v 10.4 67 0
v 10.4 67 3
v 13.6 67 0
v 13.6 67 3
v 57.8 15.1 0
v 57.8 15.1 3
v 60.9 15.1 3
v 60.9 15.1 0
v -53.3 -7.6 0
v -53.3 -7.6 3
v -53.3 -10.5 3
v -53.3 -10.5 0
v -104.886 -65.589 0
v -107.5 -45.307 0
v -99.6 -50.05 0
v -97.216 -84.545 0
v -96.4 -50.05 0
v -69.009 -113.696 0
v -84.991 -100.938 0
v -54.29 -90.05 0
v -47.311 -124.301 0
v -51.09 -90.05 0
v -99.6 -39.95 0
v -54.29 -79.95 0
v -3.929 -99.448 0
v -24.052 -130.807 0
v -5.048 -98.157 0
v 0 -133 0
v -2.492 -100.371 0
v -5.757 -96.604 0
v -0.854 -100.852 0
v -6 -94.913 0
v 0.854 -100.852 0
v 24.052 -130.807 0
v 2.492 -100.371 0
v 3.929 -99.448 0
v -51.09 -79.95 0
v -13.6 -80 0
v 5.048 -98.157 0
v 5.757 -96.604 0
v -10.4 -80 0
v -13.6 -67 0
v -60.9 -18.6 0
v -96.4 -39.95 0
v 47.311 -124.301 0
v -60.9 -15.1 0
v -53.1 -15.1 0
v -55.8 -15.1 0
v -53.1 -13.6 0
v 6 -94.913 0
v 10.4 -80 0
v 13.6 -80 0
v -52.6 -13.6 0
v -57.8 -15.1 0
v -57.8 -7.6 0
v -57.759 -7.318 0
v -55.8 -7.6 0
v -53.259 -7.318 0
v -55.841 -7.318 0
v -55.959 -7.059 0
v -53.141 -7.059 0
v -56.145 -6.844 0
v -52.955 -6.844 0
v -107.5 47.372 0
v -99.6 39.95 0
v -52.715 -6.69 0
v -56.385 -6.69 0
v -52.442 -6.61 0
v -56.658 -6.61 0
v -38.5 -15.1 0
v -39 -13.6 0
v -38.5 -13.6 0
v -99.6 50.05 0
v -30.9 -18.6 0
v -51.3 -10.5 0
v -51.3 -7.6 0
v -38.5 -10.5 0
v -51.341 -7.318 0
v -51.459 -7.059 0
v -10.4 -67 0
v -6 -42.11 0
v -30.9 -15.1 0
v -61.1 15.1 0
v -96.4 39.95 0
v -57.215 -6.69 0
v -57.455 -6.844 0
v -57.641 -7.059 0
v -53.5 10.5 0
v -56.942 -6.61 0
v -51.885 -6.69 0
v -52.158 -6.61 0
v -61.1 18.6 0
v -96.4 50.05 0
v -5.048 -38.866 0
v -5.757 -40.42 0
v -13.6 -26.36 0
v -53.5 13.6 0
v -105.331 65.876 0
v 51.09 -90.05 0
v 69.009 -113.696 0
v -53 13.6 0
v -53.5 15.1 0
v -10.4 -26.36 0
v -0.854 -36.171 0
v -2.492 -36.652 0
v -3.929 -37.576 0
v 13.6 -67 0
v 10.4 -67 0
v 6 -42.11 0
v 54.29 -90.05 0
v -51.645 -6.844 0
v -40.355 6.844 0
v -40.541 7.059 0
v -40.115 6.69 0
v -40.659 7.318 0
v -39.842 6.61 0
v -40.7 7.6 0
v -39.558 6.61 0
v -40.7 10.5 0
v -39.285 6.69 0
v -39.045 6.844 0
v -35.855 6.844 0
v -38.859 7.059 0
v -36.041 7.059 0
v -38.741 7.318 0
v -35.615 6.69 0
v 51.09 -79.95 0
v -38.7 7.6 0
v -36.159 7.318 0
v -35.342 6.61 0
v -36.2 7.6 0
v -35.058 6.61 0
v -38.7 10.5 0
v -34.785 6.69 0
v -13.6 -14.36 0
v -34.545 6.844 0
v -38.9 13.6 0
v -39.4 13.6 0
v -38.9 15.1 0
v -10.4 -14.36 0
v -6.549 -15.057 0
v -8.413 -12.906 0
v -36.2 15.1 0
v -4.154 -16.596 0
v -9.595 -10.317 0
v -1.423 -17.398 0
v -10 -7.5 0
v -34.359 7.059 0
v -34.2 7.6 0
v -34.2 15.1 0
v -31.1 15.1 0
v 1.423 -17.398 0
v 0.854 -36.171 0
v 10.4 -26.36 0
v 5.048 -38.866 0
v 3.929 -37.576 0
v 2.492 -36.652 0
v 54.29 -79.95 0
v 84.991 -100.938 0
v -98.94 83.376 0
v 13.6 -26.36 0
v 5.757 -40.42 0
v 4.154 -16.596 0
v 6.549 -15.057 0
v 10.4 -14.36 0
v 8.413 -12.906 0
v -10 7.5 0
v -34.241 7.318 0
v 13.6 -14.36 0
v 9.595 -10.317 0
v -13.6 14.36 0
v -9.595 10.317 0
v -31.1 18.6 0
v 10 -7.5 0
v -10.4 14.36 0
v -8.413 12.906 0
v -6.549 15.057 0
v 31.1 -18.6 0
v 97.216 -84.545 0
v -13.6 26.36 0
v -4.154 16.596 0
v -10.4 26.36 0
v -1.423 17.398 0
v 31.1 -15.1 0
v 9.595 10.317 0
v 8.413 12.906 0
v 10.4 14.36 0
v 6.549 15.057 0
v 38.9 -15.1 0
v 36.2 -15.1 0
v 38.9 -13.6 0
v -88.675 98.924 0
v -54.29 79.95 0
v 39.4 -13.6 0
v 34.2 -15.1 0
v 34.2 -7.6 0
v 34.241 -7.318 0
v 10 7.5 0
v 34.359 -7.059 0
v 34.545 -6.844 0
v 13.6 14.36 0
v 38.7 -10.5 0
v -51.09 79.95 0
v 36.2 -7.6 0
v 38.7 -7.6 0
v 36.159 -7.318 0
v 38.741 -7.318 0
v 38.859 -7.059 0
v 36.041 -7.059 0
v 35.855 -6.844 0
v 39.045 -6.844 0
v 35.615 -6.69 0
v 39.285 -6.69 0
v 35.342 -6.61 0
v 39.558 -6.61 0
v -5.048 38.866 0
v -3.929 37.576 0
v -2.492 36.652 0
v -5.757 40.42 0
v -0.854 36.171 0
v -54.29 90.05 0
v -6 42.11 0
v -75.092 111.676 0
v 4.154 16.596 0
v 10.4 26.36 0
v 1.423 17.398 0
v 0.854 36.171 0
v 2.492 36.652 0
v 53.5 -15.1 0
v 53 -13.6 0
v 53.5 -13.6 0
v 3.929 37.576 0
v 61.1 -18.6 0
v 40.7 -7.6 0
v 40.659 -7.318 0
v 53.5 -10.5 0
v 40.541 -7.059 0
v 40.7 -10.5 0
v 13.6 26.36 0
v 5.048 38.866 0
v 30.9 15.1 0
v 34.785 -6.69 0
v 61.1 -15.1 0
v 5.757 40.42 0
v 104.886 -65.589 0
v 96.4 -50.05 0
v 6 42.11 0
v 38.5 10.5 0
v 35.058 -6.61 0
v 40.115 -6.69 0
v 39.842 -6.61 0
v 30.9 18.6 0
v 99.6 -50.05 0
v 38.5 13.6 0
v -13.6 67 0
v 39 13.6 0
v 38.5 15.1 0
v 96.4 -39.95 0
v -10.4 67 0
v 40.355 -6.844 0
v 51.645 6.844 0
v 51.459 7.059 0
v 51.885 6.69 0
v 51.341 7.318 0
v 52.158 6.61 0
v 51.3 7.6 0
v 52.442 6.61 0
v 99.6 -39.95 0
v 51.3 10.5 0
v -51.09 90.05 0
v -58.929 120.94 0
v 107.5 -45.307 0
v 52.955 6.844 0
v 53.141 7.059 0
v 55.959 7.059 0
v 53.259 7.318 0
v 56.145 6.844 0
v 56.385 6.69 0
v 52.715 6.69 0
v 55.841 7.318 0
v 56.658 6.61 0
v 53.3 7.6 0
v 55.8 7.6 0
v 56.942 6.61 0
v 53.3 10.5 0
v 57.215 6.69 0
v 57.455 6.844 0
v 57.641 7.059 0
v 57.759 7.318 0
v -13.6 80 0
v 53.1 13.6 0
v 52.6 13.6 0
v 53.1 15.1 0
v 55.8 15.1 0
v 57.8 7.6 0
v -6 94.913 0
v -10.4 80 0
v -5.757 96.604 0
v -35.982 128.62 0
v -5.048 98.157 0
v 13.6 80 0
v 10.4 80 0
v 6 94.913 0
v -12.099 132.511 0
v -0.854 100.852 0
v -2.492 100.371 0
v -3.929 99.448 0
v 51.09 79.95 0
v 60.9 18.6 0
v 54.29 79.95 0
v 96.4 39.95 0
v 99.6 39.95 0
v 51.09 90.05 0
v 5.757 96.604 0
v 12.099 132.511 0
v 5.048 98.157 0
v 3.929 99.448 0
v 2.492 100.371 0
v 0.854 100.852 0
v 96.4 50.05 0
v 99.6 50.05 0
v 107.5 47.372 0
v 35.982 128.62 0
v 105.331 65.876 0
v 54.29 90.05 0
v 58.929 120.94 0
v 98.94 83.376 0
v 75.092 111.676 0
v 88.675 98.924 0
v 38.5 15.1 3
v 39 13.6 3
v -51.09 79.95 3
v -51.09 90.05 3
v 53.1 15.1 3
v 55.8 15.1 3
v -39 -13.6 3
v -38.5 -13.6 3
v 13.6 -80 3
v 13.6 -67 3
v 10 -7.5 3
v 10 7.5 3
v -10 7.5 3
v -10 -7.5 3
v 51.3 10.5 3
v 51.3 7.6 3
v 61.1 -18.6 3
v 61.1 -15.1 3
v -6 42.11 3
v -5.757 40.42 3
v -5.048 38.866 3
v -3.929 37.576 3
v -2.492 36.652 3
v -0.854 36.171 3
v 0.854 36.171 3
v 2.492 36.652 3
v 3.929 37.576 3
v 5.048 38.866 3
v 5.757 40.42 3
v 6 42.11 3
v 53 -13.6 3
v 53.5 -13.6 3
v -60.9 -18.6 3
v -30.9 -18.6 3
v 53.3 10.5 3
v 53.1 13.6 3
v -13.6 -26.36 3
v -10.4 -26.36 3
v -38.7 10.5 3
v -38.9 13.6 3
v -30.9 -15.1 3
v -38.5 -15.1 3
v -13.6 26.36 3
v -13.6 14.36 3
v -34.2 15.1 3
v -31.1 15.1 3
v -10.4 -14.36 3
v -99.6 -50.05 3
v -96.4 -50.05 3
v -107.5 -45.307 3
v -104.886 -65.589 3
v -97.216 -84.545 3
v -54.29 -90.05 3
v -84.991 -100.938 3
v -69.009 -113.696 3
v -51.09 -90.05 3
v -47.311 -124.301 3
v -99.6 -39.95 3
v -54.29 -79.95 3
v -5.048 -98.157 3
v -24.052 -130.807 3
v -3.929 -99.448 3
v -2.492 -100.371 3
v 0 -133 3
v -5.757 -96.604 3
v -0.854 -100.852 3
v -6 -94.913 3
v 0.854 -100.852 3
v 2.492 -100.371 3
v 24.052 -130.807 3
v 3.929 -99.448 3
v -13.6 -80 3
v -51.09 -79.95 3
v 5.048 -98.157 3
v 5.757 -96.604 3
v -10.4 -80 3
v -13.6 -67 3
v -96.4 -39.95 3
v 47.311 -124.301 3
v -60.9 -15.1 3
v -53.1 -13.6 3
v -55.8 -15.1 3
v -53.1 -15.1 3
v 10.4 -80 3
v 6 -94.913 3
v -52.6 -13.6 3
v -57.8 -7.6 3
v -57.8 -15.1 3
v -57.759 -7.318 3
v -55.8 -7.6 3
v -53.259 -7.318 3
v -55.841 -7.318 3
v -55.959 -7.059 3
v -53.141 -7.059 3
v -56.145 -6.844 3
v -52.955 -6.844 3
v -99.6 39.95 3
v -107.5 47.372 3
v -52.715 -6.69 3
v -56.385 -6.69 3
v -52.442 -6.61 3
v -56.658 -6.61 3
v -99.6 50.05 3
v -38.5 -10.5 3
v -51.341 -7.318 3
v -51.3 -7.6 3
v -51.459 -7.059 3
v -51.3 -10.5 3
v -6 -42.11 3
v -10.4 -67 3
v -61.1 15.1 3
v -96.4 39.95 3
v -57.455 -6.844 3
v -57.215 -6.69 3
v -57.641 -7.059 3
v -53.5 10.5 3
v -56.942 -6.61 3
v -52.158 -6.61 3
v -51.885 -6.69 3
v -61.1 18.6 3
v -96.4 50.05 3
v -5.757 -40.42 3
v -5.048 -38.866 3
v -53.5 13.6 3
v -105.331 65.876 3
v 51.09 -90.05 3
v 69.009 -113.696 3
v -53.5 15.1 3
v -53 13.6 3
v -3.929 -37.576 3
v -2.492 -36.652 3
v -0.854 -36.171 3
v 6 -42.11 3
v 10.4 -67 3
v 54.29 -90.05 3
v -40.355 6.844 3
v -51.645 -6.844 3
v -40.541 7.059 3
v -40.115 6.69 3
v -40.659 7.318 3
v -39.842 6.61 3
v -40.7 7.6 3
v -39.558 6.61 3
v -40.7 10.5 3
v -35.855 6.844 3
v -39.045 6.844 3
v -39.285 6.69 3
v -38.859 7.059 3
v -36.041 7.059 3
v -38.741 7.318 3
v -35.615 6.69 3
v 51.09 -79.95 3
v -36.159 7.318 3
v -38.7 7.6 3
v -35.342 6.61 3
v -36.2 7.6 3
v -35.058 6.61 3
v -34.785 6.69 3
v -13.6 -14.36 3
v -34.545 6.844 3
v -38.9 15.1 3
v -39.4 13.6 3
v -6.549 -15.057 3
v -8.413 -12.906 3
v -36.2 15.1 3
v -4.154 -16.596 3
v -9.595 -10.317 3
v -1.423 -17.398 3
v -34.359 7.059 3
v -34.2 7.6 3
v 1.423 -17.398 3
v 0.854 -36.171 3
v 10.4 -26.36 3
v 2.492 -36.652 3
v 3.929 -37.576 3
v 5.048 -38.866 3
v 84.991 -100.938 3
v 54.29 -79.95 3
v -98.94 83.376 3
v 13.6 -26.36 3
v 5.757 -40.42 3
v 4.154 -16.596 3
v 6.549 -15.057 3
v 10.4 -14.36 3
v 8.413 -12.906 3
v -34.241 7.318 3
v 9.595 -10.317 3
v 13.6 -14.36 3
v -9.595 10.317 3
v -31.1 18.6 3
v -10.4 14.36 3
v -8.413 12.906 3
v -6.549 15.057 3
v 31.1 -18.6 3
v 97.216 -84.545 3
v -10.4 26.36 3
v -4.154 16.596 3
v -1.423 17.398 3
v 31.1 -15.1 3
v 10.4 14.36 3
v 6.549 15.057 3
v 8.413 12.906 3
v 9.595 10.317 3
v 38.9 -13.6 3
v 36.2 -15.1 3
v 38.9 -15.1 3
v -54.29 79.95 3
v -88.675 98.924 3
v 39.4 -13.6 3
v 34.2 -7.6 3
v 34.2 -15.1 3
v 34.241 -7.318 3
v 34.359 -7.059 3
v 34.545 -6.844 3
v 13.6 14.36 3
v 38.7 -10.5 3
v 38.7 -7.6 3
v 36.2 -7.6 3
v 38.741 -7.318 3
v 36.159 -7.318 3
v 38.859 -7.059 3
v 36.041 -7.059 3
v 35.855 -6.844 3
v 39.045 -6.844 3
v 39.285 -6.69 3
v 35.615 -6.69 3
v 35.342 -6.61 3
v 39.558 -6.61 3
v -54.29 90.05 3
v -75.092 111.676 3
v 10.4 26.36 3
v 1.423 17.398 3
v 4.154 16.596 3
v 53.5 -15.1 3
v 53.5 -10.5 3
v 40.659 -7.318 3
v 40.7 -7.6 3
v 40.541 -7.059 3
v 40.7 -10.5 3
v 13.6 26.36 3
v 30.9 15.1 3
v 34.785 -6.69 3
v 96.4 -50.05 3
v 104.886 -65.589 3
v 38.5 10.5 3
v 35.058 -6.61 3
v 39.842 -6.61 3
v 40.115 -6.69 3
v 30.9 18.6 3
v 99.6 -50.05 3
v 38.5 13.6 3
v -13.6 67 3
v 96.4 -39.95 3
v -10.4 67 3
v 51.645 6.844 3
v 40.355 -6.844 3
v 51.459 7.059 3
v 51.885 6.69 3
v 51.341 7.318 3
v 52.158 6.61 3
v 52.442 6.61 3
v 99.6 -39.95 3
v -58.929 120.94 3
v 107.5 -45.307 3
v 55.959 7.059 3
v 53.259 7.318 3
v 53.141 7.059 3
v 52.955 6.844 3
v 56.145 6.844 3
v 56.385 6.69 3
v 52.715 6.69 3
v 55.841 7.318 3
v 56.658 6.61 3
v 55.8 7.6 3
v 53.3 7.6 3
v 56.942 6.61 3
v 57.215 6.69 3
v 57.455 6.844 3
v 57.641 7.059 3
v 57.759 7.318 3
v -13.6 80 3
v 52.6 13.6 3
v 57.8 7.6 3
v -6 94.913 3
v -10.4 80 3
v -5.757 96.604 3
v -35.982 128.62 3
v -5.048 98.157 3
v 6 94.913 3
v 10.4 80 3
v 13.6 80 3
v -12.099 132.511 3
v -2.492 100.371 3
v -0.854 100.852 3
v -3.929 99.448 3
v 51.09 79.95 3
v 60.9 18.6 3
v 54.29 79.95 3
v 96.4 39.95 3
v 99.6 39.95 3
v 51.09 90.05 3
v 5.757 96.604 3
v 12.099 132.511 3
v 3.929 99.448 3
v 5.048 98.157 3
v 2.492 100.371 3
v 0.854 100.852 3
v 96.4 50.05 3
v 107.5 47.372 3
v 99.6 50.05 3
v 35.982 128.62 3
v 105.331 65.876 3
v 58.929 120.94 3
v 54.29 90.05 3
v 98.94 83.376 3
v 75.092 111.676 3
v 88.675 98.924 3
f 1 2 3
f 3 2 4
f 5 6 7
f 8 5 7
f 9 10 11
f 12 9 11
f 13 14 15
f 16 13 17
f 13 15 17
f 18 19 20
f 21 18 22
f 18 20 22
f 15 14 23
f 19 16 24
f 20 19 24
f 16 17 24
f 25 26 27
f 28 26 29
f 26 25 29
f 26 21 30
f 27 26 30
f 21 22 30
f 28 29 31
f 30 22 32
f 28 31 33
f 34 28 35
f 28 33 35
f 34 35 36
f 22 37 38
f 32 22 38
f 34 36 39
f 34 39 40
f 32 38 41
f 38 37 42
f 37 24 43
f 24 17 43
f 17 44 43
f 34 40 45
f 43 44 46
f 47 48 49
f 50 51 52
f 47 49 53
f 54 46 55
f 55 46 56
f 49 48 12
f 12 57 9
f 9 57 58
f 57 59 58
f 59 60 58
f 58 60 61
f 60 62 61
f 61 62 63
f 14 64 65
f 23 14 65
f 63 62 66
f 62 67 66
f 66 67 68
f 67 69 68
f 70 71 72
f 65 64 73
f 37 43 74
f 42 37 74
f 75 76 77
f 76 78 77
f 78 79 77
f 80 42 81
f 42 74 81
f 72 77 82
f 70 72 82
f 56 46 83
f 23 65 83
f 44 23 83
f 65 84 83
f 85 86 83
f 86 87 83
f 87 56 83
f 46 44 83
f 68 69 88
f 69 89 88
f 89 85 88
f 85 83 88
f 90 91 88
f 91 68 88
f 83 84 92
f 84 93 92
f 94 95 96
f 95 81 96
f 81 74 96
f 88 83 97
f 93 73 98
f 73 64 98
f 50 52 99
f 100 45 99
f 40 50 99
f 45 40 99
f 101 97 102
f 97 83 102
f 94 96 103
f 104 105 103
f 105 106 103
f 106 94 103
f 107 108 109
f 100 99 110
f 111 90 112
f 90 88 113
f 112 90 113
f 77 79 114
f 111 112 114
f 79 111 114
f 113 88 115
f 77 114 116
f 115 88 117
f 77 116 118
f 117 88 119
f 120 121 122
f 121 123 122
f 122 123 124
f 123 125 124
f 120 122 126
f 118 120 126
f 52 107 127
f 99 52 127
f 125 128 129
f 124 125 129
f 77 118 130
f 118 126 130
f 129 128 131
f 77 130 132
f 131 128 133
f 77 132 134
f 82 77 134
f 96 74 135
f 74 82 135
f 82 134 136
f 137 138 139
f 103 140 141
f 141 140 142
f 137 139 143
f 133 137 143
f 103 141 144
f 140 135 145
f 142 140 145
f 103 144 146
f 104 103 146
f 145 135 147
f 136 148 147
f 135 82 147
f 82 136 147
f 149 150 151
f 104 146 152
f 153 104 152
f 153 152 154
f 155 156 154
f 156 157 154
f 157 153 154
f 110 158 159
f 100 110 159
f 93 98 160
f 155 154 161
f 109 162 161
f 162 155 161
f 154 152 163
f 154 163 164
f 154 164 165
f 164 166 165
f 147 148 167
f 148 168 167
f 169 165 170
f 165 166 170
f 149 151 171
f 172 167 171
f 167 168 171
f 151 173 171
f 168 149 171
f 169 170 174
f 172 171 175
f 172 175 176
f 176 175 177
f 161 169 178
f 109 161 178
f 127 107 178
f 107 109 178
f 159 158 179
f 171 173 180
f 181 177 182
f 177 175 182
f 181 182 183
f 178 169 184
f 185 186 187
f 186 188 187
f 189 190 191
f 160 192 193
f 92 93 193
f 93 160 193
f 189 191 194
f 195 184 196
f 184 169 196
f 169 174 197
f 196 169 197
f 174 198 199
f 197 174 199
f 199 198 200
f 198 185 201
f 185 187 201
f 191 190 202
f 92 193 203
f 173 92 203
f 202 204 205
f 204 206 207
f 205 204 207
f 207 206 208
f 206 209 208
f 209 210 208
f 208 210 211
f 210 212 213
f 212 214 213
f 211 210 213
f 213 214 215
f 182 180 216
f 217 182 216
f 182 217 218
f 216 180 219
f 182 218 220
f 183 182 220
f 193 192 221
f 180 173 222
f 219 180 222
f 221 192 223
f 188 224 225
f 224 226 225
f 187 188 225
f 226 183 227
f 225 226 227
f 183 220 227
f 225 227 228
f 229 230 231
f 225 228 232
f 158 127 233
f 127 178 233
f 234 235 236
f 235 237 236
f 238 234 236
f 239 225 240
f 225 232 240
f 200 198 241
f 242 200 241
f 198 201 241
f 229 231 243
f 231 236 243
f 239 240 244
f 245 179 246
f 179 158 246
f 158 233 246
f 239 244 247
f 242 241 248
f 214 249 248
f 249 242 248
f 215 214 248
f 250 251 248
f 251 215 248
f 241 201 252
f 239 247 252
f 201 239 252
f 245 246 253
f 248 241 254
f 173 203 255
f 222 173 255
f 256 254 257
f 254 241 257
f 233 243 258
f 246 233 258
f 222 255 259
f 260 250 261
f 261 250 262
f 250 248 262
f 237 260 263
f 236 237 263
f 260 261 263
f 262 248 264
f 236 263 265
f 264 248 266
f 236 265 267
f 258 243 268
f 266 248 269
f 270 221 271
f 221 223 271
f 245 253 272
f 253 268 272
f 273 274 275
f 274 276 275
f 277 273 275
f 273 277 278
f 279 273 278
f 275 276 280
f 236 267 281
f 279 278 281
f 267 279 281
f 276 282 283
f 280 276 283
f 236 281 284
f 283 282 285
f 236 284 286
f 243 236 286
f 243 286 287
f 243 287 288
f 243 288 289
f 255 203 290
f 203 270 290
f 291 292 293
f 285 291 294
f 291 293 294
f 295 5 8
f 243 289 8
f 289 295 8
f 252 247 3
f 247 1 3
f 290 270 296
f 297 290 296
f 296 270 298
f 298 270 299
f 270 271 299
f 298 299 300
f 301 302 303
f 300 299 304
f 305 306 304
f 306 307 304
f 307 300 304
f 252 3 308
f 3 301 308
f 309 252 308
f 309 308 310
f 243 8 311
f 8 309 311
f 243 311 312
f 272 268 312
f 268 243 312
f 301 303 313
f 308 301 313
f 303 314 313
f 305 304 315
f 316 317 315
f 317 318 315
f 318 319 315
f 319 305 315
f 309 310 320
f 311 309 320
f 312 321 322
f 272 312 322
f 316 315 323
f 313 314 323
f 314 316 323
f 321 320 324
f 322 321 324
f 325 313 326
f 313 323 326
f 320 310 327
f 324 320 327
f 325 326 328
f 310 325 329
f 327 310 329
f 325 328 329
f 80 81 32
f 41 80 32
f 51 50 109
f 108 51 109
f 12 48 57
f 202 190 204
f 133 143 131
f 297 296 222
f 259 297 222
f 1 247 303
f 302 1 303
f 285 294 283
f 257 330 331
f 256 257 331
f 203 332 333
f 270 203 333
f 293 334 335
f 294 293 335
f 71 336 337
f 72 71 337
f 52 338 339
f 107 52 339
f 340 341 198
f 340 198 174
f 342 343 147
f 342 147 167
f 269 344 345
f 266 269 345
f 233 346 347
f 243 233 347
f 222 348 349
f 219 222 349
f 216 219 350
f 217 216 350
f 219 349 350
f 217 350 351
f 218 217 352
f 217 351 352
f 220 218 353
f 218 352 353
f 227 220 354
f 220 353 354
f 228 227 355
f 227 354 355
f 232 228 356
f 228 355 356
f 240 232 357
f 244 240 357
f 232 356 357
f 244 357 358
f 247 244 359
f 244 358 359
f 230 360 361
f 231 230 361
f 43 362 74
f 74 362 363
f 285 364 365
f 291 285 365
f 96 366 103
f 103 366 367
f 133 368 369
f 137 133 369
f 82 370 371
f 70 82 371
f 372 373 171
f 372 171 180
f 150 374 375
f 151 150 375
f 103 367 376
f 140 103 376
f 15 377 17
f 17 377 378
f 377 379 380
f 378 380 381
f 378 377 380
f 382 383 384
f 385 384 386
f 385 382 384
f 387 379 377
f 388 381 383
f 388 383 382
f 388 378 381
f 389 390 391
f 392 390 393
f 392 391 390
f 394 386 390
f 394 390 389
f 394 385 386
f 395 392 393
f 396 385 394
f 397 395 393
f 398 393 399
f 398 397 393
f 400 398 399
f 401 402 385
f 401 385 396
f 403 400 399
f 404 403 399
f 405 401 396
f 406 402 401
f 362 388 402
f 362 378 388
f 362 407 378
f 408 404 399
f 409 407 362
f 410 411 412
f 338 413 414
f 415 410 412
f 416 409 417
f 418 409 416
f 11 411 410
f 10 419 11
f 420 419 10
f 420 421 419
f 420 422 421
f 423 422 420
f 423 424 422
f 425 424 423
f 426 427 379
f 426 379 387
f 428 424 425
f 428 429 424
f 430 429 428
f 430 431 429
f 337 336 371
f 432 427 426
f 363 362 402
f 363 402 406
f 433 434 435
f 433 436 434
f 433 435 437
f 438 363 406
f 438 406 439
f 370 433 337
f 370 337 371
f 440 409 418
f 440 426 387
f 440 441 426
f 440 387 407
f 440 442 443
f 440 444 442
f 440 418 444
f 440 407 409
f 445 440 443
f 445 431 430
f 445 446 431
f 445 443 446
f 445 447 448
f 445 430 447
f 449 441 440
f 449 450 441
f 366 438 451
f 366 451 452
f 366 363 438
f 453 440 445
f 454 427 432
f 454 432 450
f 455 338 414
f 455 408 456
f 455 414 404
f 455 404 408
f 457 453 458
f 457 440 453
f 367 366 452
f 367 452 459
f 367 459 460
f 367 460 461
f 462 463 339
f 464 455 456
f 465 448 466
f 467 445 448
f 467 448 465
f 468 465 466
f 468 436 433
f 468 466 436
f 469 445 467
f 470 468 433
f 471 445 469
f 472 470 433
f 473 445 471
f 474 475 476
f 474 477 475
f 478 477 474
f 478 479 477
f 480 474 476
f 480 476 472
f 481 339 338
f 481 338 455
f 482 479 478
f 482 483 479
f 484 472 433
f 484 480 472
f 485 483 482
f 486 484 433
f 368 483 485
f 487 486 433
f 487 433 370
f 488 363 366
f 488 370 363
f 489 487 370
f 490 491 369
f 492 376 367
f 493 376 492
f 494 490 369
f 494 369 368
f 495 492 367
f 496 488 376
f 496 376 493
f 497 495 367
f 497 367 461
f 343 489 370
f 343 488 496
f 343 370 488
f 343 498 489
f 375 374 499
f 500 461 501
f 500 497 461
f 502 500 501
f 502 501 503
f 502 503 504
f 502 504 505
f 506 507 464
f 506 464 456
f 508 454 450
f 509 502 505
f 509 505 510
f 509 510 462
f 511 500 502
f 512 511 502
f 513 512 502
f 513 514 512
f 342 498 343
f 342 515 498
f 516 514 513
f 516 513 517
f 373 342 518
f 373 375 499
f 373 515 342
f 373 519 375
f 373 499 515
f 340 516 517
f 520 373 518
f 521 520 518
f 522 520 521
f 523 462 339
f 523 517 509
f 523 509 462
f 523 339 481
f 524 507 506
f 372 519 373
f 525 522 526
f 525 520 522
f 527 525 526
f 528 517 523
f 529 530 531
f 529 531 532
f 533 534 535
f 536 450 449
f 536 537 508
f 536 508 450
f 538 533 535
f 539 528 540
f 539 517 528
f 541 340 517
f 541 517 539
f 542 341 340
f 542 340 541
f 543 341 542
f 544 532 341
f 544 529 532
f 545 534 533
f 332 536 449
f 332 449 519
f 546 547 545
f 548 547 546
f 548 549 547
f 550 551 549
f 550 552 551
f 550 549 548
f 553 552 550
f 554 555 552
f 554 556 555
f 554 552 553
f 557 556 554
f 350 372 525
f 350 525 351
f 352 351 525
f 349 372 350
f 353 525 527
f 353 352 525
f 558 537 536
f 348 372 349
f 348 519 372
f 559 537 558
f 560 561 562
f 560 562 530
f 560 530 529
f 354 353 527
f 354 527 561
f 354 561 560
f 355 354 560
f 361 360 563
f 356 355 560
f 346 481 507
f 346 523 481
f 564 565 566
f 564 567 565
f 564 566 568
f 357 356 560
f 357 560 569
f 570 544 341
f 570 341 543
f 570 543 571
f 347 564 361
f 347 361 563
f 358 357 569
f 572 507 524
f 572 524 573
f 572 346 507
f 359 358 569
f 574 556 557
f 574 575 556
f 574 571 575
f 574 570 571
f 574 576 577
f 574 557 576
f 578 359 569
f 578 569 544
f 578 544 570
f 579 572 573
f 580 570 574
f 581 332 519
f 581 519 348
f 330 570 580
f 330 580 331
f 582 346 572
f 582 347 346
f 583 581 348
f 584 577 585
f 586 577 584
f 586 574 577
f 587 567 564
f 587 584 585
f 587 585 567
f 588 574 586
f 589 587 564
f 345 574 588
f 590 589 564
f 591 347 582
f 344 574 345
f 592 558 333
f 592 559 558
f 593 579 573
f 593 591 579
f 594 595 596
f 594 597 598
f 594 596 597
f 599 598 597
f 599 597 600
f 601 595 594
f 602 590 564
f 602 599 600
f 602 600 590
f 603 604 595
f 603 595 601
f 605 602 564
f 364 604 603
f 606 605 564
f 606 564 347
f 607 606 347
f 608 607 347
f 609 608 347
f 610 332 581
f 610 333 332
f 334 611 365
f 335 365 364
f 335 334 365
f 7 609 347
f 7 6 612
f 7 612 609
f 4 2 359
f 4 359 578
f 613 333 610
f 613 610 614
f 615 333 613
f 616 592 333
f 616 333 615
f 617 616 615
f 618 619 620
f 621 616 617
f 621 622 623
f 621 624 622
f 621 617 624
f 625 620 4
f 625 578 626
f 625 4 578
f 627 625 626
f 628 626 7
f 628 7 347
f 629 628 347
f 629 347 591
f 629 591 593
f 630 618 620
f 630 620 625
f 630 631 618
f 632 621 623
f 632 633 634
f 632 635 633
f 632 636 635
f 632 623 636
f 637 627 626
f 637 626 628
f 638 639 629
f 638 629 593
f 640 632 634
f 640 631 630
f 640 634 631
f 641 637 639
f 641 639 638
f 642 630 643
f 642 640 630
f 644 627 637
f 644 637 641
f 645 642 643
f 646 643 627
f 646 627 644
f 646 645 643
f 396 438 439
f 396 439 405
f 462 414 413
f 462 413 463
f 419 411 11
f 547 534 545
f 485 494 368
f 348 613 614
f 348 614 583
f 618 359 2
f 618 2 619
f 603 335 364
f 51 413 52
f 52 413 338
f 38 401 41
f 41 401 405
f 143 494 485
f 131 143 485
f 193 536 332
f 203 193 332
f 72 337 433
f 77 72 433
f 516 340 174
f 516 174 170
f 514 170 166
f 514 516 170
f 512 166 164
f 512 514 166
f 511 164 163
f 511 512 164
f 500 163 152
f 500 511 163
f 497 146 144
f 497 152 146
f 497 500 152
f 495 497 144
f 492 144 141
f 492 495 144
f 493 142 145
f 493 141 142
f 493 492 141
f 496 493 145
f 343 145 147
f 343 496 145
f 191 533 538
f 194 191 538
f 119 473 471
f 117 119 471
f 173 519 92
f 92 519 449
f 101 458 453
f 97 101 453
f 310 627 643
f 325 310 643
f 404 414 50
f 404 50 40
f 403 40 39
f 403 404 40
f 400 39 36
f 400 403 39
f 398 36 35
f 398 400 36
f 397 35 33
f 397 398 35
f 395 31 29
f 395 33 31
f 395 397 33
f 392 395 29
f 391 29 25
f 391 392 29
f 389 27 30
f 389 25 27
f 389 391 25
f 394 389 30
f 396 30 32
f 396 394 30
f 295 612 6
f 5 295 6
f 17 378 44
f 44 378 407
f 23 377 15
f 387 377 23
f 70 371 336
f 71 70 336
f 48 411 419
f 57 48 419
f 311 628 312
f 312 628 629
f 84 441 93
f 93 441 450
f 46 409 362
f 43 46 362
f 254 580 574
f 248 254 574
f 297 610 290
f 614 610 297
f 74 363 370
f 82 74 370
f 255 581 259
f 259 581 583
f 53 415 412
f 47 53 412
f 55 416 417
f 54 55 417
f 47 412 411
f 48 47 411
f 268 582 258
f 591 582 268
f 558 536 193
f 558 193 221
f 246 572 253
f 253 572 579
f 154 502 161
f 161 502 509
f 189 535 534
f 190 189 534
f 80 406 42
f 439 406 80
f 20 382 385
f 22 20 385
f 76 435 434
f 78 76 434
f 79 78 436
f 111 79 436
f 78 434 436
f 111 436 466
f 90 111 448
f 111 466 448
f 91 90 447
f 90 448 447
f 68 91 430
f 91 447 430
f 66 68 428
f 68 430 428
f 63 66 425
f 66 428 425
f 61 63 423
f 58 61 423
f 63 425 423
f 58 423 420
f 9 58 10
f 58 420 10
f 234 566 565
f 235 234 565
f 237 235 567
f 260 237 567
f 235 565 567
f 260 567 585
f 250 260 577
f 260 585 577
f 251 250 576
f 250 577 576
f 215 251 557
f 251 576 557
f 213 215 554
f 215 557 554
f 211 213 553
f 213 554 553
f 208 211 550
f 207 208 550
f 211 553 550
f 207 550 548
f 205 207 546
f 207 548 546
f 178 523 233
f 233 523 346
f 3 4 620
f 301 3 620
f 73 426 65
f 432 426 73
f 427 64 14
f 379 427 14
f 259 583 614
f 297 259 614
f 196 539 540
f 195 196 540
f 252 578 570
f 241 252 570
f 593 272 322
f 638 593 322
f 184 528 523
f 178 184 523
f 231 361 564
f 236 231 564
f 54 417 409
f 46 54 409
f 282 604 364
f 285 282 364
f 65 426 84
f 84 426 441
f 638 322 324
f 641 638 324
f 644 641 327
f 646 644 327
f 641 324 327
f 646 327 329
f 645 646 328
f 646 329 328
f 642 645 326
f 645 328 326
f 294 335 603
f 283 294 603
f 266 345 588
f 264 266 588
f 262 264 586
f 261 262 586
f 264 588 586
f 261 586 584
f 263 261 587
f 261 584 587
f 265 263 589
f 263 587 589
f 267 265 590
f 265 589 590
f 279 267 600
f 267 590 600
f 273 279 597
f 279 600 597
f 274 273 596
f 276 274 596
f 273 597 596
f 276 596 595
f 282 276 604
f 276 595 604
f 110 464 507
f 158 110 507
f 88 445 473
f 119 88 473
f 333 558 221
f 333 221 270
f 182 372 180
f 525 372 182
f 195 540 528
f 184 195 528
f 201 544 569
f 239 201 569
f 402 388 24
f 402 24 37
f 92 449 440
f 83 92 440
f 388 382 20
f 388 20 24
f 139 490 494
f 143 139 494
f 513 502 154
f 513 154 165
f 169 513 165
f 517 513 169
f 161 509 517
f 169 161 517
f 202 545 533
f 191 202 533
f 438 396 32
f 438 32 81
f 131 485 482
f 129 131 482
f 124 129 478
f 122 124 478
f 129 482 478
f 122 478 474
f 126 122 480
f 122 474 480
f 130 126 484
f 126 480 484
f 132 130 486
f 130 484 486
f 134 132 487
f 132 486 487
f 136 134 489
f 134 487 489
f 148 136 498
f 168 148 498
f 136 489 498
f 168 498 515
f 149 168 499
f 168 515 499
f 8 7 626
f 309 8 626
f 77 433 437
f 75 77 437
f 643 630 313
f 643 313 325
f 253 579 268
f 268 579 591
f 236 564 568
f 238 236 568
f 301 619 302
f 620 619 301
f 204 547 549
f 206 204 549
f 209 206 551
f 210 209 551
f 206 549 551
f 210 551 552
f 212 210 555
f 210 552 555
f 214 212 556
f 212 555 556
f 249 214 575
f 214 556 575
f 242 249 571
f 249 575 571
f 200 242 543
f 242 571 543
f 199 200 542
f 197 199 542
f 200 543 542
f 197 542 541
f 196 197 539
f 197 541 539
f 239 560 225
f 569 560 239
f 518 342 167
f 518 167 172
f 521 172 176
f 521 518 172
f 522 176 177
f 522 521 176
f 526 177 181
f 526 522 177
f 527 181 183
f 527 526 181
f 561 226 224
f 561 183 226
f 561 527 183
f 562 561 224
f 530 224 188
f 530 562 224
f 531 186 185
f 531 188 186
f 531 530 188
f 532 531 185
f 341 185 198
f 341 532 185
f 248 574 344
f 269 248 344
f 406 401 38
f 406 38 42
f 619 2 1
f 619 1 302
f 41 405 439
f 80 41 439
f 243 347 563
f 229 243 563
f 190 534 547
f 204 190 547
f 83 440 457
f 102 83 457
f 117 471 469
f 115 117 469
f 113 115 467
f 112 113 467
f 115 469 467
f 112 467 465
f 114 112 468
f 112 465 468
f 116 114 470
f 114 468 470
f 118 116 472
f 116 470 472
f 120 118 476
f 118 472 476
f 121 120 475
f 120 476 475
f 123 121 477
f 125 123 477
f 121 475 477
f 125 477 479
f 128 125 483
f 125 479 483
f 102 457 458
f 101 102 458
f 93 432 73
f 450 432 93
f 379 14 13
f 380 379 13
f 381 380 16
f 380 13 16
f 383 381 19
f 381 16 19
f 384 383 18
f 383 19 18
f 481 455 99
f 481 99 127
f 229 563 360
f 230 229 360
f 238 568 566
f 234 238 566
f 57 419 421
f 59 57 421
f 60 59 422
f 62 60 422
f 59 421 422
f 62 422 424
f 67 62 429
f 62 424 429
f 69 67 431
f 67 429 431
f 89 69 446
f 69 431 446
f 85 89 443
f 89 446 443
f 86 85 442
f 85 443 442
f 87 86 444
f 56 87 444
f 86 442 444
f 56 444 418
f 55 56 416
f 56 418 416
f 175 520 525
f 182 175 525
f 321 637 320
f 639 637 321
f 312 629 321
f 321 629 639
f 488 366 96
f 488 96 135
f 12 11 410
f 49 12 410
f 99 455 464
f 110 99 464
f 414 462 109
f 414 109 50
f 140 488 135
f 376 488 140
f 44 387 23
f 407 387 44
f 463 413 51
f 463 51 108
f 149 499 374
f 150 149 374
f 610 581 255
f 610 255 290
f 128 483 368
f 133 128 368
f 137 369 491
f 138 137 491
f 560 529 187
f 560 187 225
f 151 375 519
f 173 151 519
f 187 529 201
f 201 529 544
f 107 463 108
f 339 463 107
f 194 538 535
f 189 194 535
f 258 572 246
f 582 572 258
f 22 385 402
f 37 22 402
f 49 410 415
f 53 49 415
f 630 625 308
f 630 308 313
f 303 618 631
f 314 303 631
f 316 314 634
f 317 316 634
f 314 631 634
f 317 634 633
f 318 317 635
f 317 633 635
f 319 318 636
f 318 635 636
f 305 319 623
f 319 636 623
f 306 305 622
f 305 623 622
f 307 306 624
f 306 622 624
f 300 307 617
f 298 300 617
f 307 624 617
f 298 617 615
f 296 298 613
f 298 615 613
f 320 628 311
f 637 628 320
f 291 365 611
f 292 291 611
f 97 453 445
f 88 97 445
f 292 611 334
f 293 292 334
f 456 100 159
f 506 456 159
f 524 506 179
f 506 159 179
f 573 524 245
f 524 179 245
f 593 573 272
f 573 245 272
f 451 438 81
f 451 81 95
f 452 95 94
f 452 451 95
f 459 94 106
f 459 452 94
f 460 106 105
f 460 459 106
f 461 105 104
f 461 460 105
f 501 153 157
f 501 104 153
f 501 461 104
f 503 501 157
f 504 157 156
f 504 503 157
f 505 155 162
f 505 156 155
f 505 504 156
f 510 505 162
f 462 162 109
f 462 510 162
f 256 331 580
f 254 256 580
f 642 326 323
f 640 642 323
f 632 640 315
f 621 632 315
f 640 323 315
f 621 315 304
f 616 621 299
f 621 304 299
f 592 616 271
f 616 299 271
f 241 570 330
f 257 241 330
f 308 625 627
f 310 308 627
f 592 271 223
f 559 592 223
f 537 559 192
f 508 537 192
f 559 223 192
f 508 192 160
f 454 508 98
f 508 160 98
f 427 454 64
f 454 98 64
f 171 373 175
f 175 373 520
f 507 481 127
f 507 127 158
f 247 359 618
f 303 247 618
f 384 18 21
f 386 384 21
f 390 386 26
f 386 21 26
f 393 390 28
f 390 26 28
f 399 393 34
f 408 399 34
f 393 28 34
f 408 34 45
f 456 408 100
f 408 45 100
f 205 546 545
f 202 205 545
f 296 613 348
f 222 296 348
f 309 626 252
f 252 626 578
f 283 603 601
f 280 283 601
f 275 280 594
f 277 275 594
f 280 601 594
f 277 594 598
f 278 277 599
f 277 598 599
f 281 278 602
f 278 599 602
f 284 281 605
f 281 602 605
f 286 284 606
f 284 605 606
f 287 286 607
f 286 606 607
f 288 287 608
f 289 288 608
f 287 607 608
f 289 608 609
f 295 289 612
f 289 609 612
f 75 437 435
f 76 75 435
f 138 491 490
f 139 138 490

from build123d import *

# Parameters (mm, degrees)
BOSS_EXTRUDE1_DEPTH        = 3
SPINE_T_SLOTS_REACH        = 173.039
SPINE_MOUNTING_SLOTS_REACH = 173.039
SKETCH2_W                  = 3.2
SKETCH2_H                  = 12
SKETCH2_H_2                = 13
SIDE_PLATE_SLOTS_REACH     = 173.039
SKETCH5_W                  = 3.2
SKETCH5_H                  = 10.1
LINKAGE_CLEARANCE_REACH    = 173.039


with BuildPart() as part:
    # Sketch1 → Boss-Extrude1 (new body)
    with BuildSketch(Plane.XY):
        with BuildLine():
            Line((107.5, -45.307284183), (107.5, 47.371965948))
            ThreePointArc((107.5, 47.371965948), (94.261836832, 91.449819149), (58.928571429, 120.939927031))
            ThreePointArc((58.928571429, 120.939927031), (0, 133), (-58.928571429, 120.939927031))
            ThreePointArc((-58.928571429, 120.939927031), (-94.261836832, 91.449819149), (-107.5, 47.371965948))
            Line((-107.5, 47.371965948), (-107.5, -45.307284183))
            ThreePointArc((-107.5, -45.307284183), (-97.216406667, -84.545309636), (-69.009433962, -113.695637666))
            ThreePointArc((-69.009433962, -113.695637666), (0, -133), (69.009433962, -113.695637666))
            ThreePointArc((69.009433962, -113.695637666), (97.216406667, -84.545309636), (107.5, -45.307284183))
        make_face()
    extrude(amount=BOSS_EXTRUDE1_DEPTH)

    # Sketch4 → spine T-slots (cut, up to next)
    with BuildSketch(Plane.XY.offset(3), mode=Mode.PRIVATE) as spine_t_slots_sk1:
        with BuildLine():
            Line((60.9, 18.6), (30.9, 18.6))
            Line((30.9, 18.6), (30.9, 15.1))
            Line((30.9, 15.1), (38.5, 15.1))
            Line((38.5, 15.1), (39, 13.6))
            Line((39, 13.6), (38.5, 13.6))
            Line((38.5, 13.6), (38.5, 10.5))
            Line((38.5, 10.5), (51.3, 10.5))
            Line((51.3, 10.5), (51.3, 7.6))
            ThreePointArc((51.3, 7.6), (52.3, 6.6), (53.3, 7.6))
            Line((53.3, 7.6), (53.3, 10.5))
            Line((53.3, 10.5), (53.1, 13.6))
            Line((53.1, 13.6), (52.6, 13.6))
            Line((52.6, 13.6), (53.1, 15.1))
            Line((53.1, 15.1), (55.8, 15.1))
            Line((55.8, 15.1), (55.8, 7.6))
            ThreePointArc((55.8, 7.6), (56.8, 6.6), (57.8, 7.6))
            Line((57.8, 7.6), (57.8, 15.1))
            Line((57.8, 15.1), (60.9, 15.1))
            Line((60.9, 15.1), (60.9, 18.6))
        make_face()
    spine_t_slots_tool1 = extrude(spine_t_slots_sk1.sketch, amount=-SPINE_T_SLOTS_REACH, mode=Mode.PRIVATE) & part.part
    # Sketch4 → spine T-slots (cut, up to next)
    with BuildSketch(Plane.XY.offset(3), mode=Mode.PRIVATE) as spine_t_slots_sk2:
        with BuildLine():
            Line((31.1, -18.6), (61.1, -18.6))
            Line((61.1, -18.6), (61.1, -15.1))
            Line((61.1, -15.1), (53.5, -15.1))
            Line((53.5, -15.1), (53, -13.6))
            Line((53, -13.6), (53.5, -13.6))
            Line((53.5, -13.6), (53.5, -10.5))
            Line((53.5, -10.5), (40.7, -10.5))
            Line((40.7, -10.5), (40.7, -7.6))
            ThreePointArc((40.7, -7.6), (39.7, -6.6), (38.7, -7.6))
            Line((38.7, -7.6), (38.7, -10.5))
            Line((38.7, -10.5), (38.9, -13.6))
            Line((38.9, -13.6), (39.4, -13.6))
            Line((39.4, -13.6), (38.9, -15.1))
            Line((38.9, -15.1), (36.2, -15.1))
            Line((36.2, -15.1), (36.2, -7.6))
            ThreePointArc((36.2, -7.6), (35.2, -6.6), (34.2, -7.6))
            Line((34.2, -7.6), (34.2, -15.1))
            Line((34.2, -15.1), (31.1, -15.1))
            Line((31.1, -15.1), (31.1, -18.6))
        make_face()
    spine_t_slots_tool2 = extrude(spine_t_slots_sk2.sketch, amount=-SPINE_T_SLOTS_REACH, mode=Mode.PRIVATE) & part.part
    # Sketch4 → spine T-slots (cut, up to next)
    with BuildSketch(Plane.XY.offset(3), mode=Mode.PRIVATE) as spine_t_slots_sk3:
        with BuildLine():
            Line((-60.9, -18.6), (-30.9, -18.6))
            Line((-30.9, -18.6), (-30.9, -15.1))
            Line((-30.9, -15.1), (-38.5, -15.1))
            Line((-38.5, -15.1), (-39, -13.6))
            Line((-39, -13.6), (-38.5, -13.6))
            Line((-38.5, -13.6), (-38.5, -10.5))
            Line((-38.5, -10.5), (-51.3, -10.5))
            Line((-51.3, -10.5), (-51.3, -7.6))
            ThreePointArc((-51.3, -7.6), (-52.3, -6.6), (-53.3, -7.6))
            Line((-53.3, -7.6), (-53.3, -10.5))
            Line((-53.3, -10.5), (-53.1, -13.6))
            Line((-53.1, -13.6), (-52.6, -13.6))
            Line((-52.6, -13.6), (-53.1, -15.1))
            Line((-53.1, -15.1), (-55.8, -15.1))
            Line((-55.8, -15.1), (-55.8, -7.6))
            ThreePointArc((-55.8, -7.6), (-56.8, -6.6), (-57.8, -7.6))
            Line((-57.8, -7.6), (-57.8, -15.1))
            Line((-57.8, -15.1), (-60.9, -15.1))
            Line((-60.9, -15.1), (-60.9, -18.6))
        make_face()
    spine_t_slots_tool3 = extrude(spine_t_slots_sk3.sketch, amount=-SPINE_T_SLOTS_REACH, mode=Mode.PRIVATE) & part.part
    # Sketch4 → spine T-slots (cut, up to next)
    with BuildSketch(Plane.XY.offset(3), mode=Mode.PRIVATE) as spine_t_slots_sk4:
        with BuildLine():
            Line((-31.1, 18.6), (-61.1, 18.6))
            Line((-61.1, 18.6), (-61.1, 15.1))
            Line((-61.1, 15.1), (-53.5, 15.1))
            Line((-53.5, 15.1), (-53, 13.6))
            Line((-53, 13.6), (-53.5, 13.6))
            Line((-53.5, 13.6), (-53.5, 10.5))
            Line((-53.5, 10.5), (-40.7, 10.5))
            Line((-40.7, 10.5), (-40.7, 7.6))
            ThreePointArc((-40.7, 7.6), (-39.7, 6.6), (-38.7, 7.6))
            Line((-38.7, 7.6), (-38.7, 10.5))
            Line((-38.7, 10.5), (-38.9, 13.6))
            Line((-38.9, 13.6), (-39.4, 13.6))
            Line((-39.4, 13.6), (-38.9, 15.1))
            Line((-38.9, 15.1), (-36.2, 15.1))
            Line((-36.2, 15.1), (-36.2, 7.6))
            ThreePointArc((-36.2, 7.6), (-35.2, 6.6), (-34.2, 7.6))
            Line((-34.2, 7.6), (-34.2, 15.1))
            Line((-34.2, 15.1), (-31.1, 15.1))
            Line((-31.1, 15.1), (-31.1, 18.6))
        make_face()
    spine_t_slots_tool4 = extrude(spine_t_slots_sk4.sketch, amount=-SPINE_T_SLOTS_REACH, mode=Mode.PRIVATE) & part.part
    add(spine_t_slots_tool1.solids().sort_by_distance((47.0418, 14.653776, 3))[0], mode=Mode.SUBTRACT)
    add(spine_t_slots_tool2.solids().sort_by_distance((44.9582, -14.653776, 3))[0], mode=Mode.SUBTRACT)
    add(spine_t_slots_tool3.solids().sort_by_distance((-47.0418, -14.653776, 3))[0], mode=Mode.SUBTRACT)
    add(spine_t_slots_tool4.solids().sort_by_distance((-44.9582, 14.653776, 3))[0], mode=Mode.SUBTRACT)

    # Sketch2 → spine mounting slots (cut, up to next)
    with BuildSketch(Plane.XY.offset(3), mode=Mode.PRIVATE) as spine_mounting_slots_sk1:
        with Locations((12, 20.36)):
            Rectangle(SKETCH2_W, SKETCH2_H)
    spine_mounting_slots_tool1 = extrude(spine_mounting_slots_sk1.sketch, amount=-SPINE_MOUNTING_SLOTS_REACH, mode=Mode.PRIVATE) & part.part
    # Sketch2 → spine mounting slots (cut, up to next)
    with BuildSketch(Plane.XY.offset(3), mode=Mode.PRIVATE) as spine_mounting_slots_sk2:
        with Locations((12, 73.5)):
            Rectangle(SKETCH2_W, SKETCH2_H_2)
    spine_mounting_slots_tool2 = extrude(spine_mounting_slots_sk2.sketch, amount=-SPINE_MOUNTING_SLOTS_REACH, mode=Mode.PRIVATE) & part.part
    # Sketch2 → spine mounting slots (cut, up to next)
    with BuildSketch(Plane.XY.offset(3), mode=Mode.PRIVATE) as spine_mounting_slots_sk3:
        with Locations((-12, 73.5)):
            Rectangle(SKETCH2_W, SKETCH2_H_2)
    spine_mounting_slots_tool3 = extrude(spine_mounting_slots_sk3.sketch, amount=-SPINE_MOUNTING_SLOTS_REACH, mode=Mode.PRIVATE) & part.part
    # Sketch2 → spine mounting slots (cut, up to next)
    with BuildSketch(Plane.XY.offset(3), mode=Mode.PRIVATE) as spine_mounting_slots_sk4:
        with Locations((-12, 20.36)):
            Rectangle(SKETCH2_W, SKETCH2_H)
    spine_mounting_slots_tool4 = extrude(spine_mounting_slots_sk4.sketch, amount=-SPINE_MOUNTING_SLOTS_REACH, mode=Mode.PRIVATE) & part.part
    # Sketch2 → spine mounting slots (cut, up to next)
    with BuildSketch(Plane.XY.offset(3), mode=Mode.PRIVATE) as spine_mounting_slots_sk5:
        with Locations((-12, -20.36)):
            Rectangle(SKETCH2_W, SKETCH2_H)
    spine_mounting_slots_tool5 = extrude(spine_mounting_slots_sk5.sketch, amount=-SPINE_MOUNTING_SLOTS_REACH, mode=Mode.PRIVATE) & part.part
    # Sketch2 → spine mounting slots (cut, up to next)
    with BuildSketch(Plane.XY.offset(3), mode=Mode.PRIVATE) as spine_mounting_slots_sk6:
        with Locations((-12, -73.5)):
            Rectangle(SKETCH2_W, SKETCH2_H_2)
    spine_mounting_slots_tool6 = extrude(spine_mounting_slots_sk6.sketch, amount=-SPINE_MOUNTING_SLOTS_REACH, mode=Mode.PRIVATE) & part.part
    # Sketch2 → spine mounting slots (cut, up to next)
    with BuildSketch(Plane.XY.offset(3), mode=Mode.PRIVATE) as spine_mounting_slots_sk7:
        with Locations((12, -73.5)):
            Rectangle(SKETCH2_W, SKETCH2_H_2)
    spine_mounting_slots_tool7 = extrude(spine_mounting_slots_sk7.sketch, amount=-SPINE_MOUNTING_SLOTS_REACH, mode=Mode.PRIVATE) & part.part
    # Sketch2 → spine mounting slots (cut, up to next)
    with BuildSketch(Plane.XY.offset(3), mode=Mode.PRIVATE) as spine_mounting_slots_sk8:
        with Locations((12, -20.36)):
            Rectangle(SKETCH2_W, SKETCH2_H)
    spine_mounting_slots_tool8 = extrude(spine_mounting_slots_sk8.sketch, amount=-SPINE_MOUNTING_SLOTS_REACH, mode=Mode.PRIVATE) & part.part
    add(spine_mounting_slots_tool1.solids().sort_by_distance((12, 20.36, 3))[0], mode=Mode.SUBTRACT)
    add(spine_mounting_slots_tool2.solids().sort_by_distance((12, 73.5, 3))[0], mode=Mode.SUBTRACT)
    add(spine_mounting_slots_tool3.solids().sort_by_distance((-12, 73.5, 3))[0], mode=Mode.SUBTRACT)
    add(spine_mounting_slots_tool4.solids().sort_by_distance((-12, 20.36, 3))[0], mode=Mode.SUBTRACT)
    add(spine_mounting_slots_tool5.solids().sort_by_distance((-12, -20.36, 3))[0], mode=Mode.SUBTRACT)
    add(spine_mounting_slots_tool6.solids().sort_by_distance((-12, -73.5, 3))[0], mode=Mode.SUBTRACT)
    add(spine_mounting_slots_tool7.solids().sort_by_distance((12, -73.5, 3))[0], mode=Mode.SUBTRACT)
    add(spine_mounting_slots_tool8.solids().sort_by_distance((12, -20.36, 3))[0], mode=Mode.SUBTRACT)

    # Sketch5 → side plate slots (cut, up to next)
    with BuildSketch(Plane.XY.offset(3), mode=Mode.PRIVATE) as side_plate_slots_sk1:
        with Locations((52.69, 85)):
            Rectangle(SKETCH5_W, SKETCH5_H)
    side_plate_slots_tool1 = extrude(side_plate_slots_sk1.sketch, amount=-SIDE_PLATE_SLOTS_REACH, mode=Mode.PRIVATE) & part.part
    # Sketch5 → side plate slots (cut, up to next)
    with BuildSketch(Plane.XY.offset(3), mode=Mode.PRIVATE) as side_plate_slots_sk2:
        with Locations((52.69, -85)):
            Rectangle(SKETCH5_W, SKETCH5_H)
    side_plate_slots_tool2 = extrude(side_plate_slots_sk2.sketch, amount=-SIDE_PLATE_SLOTS_REACH, mode=Mode.PRIVATE) & part.part
    # Sketch5 → side plate slots (cut, up to next)
    with BuildSketch(Plane.XY.offset(3), mode=Mode.PRIVATE) as side_plate_slots_sk3:
        with Locations((-52.69, 85)):
            Rectangle(SKETCH5_W, SKETCH5_H)
    side_plate_slots_tool3 = extrude(side_plate_slots_sk3.sketch, amount=-SIDE_PLATE_SLOTS_REACH, mode=Mode.PRIVATE) & part.part
    # Sketch5 → side plate slots (cut, up to next)
    with BuildSketch(Plane.XY.offset(3), mode=Mode.PRIVATE) as side_plate_slots_sk4:
        with Locations((-52.69, -85)):
            Rectangle(SKETCH5_W, SKETCH5_H)
    side_plate_slots_tool4 = extrude(side_plate_slots_sk4.sketch, amount=-SIDE_PLATE_SLOTS_REACH, mode=Mode.PRIVATE) & part.part
    # Sketch5 → side plate slots (cut, up to next)
    with BuildSketch(Plane.XY.offset(3), mode=Mode.PRIVATE) as side_plate_slots_sk5:
        with Locations((98, 45)):
            Rectangle(SKETCH5_W, SKETCH5_H)
    side_plate_slots_tool5 = extrude(side_plate_slots_sk5.sketch, amount=-SIDE_PLATE_SLOTS_REACH, mode=Mode.PRIVATE) & part.part
    # Sketch5 → side plate slots (cut, up to next)
    with BuildSketch(Plane.XY.offset(3), mode=Mode.PRIVATE) as side_plate_slots_sk6:
        with Locations((98, -45)):
            Rectangle(SKETCH5_W, SKETCH5_H)
    side_plate_slots_tool6 = extrude(side_plate_slots_sk6.sketch, amount=-SIDE_PLATE_SLOTS_REACH, mode=Mode.PRIVATE) & part.part
    # Sketch5 → side plate slots (cut, up to next)
    with BuildSketch(Plane.XY.offset(3), mode=Mode.PRIVATE) as side_plate_slots_sk7:
        with Locations((-98, -45)):
            Rectangle(SKETCH5_W, SKETCH5_H)
    side_plate_slots_tool7 = extrude(side_plate_slots_sk7.sketch, amount=-SIDE_PLATE_SLOTS_REACH, mode=Mode.PRIVATE) & part.part
    # Sketch5 → side plate slots (cut, up to next)
    with BuildSketch(Plane.XY.offset(3), mode=Mode.PRIVATE) as side_plate_slots_sk8:
        with Locations((-98, 45)):
            Rectangle(SKETCH5_W, SKETCH5_H)
    side_plate_slots_tool8 = extrude(side_plate_slots_sk8.sketch, amount=-SIDE_PLATE_SLOTS_REACH, mode=Mode.PRIVATE) & part.part
    add(side_plate_slots_tool1.solids().sort_by_distance((52.69, 85, 3))[0], mode=Mode.SUBTRACT)
    add(side_plate_slots_tool2.solids().sort_by_distance((52.69, -85, 3))[0], mode=Mode.SUBTRACT)
    add(side_plate_slots_tool3.solids().sort_by_distance((-52.69, 85, 3))[0], mode=Mode.SUBTRACT)
    add(side_plate_slots_tool4.solids().sort_by_distance((-52.69, -85, 3))[0], mode=Mode.SUBTRACT)
    add(side_plate_slots_tool5.solids().sort_by_distance((98, 45, 3))[0], mode=Mode.SUBTRACT)
    add(side_plate_slots_tool6.solids().sort_by_distance((98, -45, 3))[0], mode=Mode.SUBTRACT)
    add(side_plate_slots_tool7.solids().sort_by_distance((-98, -45, 3))[0], mode=Mode.SUBTRACT)
    add(side_plate_slots_tool8.solids().sort_by_distance((-98, 45, 3))[0], mode=Mode.SUBTRACT)

    # Sketch3 → linkage clearance (cut, up to next)
    with BuildSketch(Plane.XY.offset(3), mode=Mode.PRIVATE) as linkage_clearance_sk1:
        with BuildLine():
            Line((-6, -94.913476789), (-6, -42.110007057))
            ThreePointArc((-6, -42.110007057), (0, -36.110007057), (6, -42.110007057))
            Line((6, -42.110007057), (6, -94.913476789))
            ThreePointArc((6, -94.913476789), (0, -100.913476789), (-6, -94.913476789))
        make_face()
    linkage_clearance_tool1 = extrude(linkage_clearance_sk1.sketch, amount=-LINKAGE_CLEARANCE_REACH, mode=Mode.PRIVATE) & part.part
    # Sketch3 → linkage clearance (cut, up to next)
    with BuildSketch(Plane.XY.offset(3), mode=Mode.PRIVATE) as linkage_clearance_sk2:
        with BuildLine():
            Line((-6, 94.913476789), (-6, 42.110007057))
            ThreePointArc((-6, 42.110007057), (0, 36.110007057), (6, 42.110007057))
            Line((6, 42.110007057), (6, 94.913476789))
            ThreePointArc((6, 94.913476789), (0, 100.913476789), (-6, 94.913476789))
        make_face()
    linkage_clearance_tool2 = extrude(linkage_clearance_sk2.sketch, amount=-LINKAGE_CLEARANCE_REACH, mode=Mode.PRIVATE) & part.part
    # Sketch3 → linkage clearance (cut, up to next)
    with BuildSketch(Plane.XY.offset(3), mode=Mode.PRIVATE) as linkage_clearance_sk3:
        with BuildLine():
            Line((10, 7.5), (10, -7.5))
            ThreePointArc((10, -7.5), (0, -17.5), (-10, -7.5))
            Line((-10, -7.5), (-10, 7.5))
            ThreePointArc((-10, 7.5), (0, 17.5), (10, 7.5))
        make_face()
    linkage_clearance_tool3 = extrude(linkage_clearance_sk3.sketch, amount=-LINKAGE_CLEARANCE_REACH, mode=Mode.PRIVATE) & part.part
    add(linkage_clearance_tool1.solids().sort_by_distance((0, -68.511742, 3))[0], mode=Mode.SUBTRACT)
    add(linkage_clearance_tool2.solids().sort_by_distance((0, 68.511742, 3))[0], mode=Mode.SUBTRACT)
    add(linkage_clearance_tool3.solids().sort_by_distance((0, 0, 3))[0], mode=Mode.SUBTRACT)


solid = part.part
